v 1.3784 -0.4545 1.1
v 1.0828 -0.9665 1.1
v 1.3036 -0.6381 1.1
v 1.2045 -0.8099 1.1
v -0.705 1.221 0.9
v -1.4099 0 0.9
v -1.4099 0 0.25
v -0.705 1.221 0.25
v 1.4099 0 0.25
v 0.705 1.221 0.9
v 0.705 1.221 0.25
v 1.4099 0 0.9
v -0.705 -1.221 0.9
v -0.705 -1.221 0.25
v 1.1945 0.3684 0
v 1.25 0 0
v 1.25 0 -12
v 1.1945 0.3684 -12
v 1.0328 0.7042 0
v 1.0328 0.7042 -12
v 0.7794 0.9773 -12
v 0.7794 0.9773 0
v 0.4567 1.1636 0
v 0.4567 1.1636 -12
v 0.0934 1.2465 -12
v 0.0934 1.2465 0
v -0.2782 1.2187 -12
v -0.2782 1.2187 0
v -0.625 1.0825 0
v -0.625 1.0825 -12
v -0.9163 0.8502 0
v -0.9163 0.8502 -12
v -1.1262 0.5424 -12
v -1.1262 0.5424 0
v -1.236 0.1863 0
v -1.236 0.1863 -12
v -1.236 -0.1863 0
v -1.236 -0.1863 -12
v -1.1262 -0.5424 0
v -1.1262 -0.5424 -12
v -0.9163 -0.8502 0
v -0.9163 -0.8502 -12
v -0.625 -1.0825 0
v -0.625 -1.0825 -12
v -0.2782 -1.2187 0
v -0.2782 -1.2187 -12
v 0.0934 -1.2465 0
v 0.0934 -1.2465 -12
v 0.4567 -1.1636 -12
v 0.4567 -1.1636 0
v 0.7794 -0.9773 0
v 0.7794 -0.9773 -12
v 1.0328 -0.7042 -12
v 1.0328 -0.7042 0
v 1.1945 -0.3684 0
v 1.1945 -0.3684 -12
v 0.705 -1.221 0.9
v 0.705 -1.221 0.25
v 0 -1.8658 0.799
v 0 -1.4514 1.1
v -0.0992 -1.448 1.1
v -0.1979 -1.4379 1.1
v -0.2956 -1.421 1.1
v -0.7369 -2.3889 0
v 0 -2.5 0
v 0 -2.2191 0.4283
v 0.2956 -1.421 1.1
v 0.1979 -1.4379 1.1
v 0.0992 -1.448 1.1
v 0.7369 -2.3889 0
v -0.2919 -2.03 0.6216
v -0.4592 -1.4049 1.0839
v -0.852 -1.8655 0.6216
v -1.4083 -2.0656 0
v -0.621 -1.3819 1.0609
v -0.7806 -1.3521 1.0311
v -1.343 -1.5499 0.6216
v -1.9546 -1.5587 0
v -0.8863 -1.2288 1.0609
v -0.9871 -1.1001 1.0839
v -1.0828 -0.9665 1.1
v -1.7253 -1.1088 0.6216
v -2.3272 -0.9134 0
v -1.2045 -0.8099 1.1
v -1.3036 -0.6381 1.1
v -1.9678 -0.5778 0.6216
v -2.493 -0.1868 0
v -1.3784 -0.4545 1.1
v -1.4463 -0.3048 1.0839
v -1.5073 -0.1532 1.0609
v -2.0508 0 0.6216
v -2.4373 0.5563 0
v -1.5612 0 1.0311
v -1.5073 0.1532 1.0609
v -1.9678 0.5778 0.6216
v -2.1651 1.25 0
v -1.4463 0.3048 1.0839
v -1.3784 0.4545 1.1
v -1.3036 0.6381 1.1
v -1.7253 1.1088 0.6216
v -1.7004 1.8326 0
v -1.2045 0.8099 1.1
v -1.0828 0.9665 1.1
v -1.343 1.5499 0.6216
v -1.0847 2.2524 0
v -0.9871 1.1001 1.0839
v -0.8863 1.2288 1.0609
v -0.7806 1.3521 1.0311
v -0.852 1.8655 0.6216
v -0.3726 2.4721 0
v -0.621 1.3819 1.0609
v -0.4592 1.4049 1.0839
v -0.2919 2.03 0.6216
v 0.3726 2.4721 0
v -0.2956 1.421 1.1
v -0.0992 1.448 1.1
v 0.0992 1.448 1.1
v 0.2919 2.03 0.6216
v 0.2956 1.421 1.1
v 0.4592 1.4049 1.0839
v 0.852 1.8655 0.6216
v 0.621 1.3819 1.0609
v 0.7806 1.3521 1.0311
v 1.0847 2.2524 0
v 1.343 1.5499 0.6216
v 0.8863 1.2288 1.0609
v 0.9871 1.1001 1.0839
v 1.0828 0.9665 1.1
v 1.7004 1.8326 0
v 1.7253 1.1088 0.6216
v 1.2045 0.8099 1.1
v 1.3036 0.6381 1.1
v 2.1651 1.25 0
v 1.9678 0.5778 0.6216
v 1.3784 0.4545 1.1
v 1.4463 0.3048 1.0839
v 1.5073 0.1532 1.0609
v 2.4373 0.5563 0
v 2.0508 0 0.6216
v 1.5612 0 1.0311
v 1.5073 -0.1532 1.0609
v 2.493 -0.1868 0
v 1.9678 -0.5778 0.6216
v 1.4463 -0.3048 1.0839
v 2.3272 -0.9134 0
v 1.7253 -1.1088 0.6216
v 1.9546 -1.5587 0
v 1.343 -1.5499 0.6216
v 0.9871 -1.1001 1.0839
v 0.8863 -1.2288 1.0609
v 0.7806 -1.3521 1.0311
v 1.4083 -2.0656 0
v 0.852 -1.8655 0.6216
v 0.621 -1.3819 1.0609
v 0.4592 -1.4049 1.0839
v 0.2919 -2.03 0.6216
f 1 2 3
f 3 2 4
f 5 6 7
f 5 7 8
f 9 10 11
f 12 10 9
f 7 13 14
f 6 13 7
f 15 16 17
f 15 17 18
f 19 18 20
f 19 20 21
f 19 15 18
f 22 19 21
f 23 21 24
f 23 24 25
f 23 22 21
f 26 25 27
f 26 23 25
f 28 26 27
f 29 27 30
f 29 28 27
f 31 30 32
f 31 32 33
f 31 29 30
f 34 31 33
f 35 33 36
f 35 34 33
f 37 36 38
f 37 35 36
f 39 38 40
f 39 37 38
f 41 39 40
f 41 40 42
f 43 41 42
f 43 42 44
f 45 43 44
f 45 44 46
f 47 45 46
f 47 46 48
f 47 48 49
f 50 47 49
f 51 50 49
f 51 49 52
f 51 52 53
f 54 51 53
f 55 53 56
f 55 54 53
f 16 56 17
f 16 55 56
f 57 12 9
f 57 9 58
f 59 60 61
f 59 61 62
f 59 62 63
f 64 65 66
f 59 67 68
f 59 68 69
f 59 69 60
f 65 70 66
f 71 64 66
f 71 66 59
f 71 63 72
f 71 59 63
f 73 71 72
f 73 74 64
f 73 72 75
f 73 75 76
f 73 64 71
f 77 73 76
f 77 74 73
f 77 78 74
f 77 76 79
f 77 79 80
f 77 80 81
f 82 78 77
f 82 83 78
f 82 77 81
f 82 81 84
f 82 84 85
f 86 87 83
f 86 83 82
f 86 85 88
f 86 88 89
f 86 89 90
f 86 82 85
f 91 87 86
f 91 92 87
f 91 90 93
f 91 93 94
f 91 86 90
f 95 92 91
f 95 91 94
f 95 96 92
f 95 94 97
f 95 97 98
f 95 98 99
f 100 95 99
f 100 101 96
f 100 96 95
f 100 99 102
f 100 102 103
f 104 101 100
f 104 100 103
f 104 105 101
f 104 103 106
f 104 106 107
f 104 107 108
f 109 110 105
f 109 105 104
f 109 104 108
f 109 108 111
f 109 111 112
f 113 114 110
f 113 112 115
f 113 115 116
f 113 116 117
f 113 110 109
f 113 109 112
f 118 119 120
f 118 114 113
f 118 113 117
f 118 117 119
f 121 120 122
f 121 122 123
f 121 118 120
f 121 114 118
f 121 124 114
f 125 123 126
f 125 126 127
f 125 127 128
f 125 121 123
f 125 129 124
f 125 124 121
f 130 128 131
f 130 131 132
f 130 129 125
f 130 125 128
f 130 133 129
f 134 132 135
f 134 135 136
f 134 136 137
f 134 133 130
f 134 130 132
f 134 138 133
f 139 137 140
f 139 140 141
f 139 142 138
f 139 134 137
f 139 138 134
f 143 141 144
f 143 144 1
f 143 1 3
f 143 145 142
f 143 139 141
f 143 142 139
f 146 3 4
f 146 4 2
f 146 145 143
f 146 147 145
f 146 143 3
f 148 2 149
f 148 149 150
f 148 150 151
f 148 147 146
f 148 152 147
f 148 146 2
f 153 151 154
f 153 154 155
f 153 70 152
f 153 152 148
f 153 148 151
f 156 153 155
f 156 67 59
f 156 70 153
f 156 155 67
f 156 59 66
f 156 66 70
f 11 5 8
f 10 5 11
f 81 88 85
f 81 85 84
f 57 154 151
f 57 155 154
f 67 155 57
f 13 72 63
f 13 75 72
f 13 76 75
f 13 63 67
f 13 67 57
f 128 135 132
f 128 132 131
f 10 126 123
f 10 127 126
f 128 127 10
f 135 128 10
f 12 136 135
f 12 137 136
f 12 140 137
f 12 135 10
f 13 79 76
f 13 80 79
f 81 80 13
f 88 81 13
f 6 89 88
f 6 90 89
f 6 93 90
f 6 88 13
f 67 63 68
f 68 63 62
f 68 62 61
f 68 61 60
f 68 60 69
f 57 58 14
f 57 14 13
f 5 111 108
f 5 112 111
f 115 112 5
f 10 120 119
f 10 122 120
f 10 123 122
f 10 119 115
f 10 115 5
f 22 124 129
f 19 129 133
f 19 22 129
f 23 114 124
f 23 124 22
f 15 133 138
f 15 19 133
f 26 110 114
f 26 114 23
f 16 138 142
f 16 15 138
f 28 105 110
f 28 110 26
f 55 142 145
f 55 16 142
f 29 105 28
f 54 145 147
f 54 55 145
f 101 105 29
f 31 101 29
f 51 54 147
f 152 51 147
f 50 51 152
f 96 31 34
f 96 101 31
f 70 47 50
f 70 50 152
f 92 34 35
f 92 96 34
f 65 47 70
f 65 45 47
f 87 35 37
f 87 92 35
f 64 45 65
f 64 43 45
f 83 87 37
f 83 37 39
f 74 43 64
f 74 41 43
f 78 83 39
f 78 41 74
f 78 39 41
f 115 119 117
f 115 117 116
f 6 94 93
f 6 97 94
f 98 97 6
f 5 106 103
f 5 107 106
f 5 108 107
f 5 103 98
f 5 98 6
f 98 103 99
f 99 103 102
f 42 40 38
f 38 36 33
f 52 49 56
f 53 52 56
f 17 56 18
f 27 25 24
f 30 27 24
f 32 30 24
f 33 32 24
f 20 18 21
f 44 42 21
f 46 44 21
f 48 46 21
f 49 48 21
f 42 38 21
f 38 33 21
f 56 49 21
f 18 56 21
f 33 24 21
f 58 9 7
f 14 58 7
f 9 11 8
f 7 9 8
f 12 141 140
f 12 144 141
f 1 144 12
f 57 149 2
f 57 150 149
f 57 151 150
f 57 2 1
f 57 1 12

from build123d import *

# Parameters (mm, degrees)
SKETCH1_R               = 1.25
BOSS_EXTRUDE1_DEPTH     = 12
CUT_EXTRUDE1_DEPTH      = 1.25
CUT_EXTRUDE2_DEPTH      = 13.509996003
CUT_EXTRUDE2_DEPTH_BACK = 13.509996003
SKETCH6_W               = 1.249656436
SKETCH6_H               = 4.384153796
CHAMFER2_SIZE           = 0.2


with BuildPart() as part:
    # Sketch1 → Boss-Extrude1 (new body)
    with BuildSketch(Plane.XY):
        Circle(SKETCH1_R)
    extrude(amount=-BOSS_EXTRUDE1_DEPTH)

    # Sketch3 → Revolve1 (revolve)
    with BuildSketch(Plane(origin=(0, 0, 0), x_dir=(0, 0, -1), z_dir=(1, 0, 0)), mode=Mode.PRIVATE) as revolve1_sk:
        with BuildLine():
            ThreePointArc((-1.5, 0), (-1.096229956, 1.457737974), (0, 2.5))
            Line((0, 2.5), (0, 0))
            Line((0, 0), (-1.5, 0))
        make_face()
    revolve(revolve1_sk.sketch.rotate(Axis((0, 0, 1.5), (0, 0, -1)), 180), axis=Axis((0, 0, 1.5), (0, 0, -1)))

    # Sketch5 → Cut-Extrude1 (cut)
    with BuildSketch(Plane(origin=(0, 0, 1.5), x_dir=(-1, 0, 0), z_dir=(0, 0, -1))):
        Polygon((-1.409901945, 0), (-0.704950973, -1.221010901), (0.704950973, -1.221010901), (1.409901945, 0), (0.704950973, 1.221010901), (-0.704950973, 1.221010901), align=None)
    extrude(amount=CUT_EXTRUDE1_DEPTH, mode=Mode.SUBTRACT)

    # Sketch6 → Cut-Extrude2 (cut, two sides: drawn at the far end of the back side and taken through both)
    with BuildSketch(Plane(origin=(0, 0, 0), x_dir=(0, 0, -1), z_dir=(1, 0, 0)).offset(-CUT_EXTRUDE2_DEPTH_BACK)):
        with Locations((-1.724828218, 0.205450463)):
            Rectangle(SKETCH6_W, SKETCH6_H)
    extrude(amount=CUT_EXTRUDE2_DEPTH + CUT_EXTRUDE2_DEPTH_BACK, mode=Mode.SUBTRACT)

    # Chamfer2
    # the kernel refuses this chamfer: 0.2 mm, written as the material it takes off along each edge
    with BuildSketch(Plane(origin=(1.21928757, 1.221010901, 1.1), x_dir=(1.0390370186618431e-14, 0.9996219169112966, 0.02749587661058733), z_dir=(-1, 0, 0))) as chamfer2_piece_1_section:
        Polygon((CHAMFER2_SIZE * 0.999621916911, CHAMFER2_SIZE * 0.0274958766106), (-CHAMFER2_SIZE * 0.0274958766106, CHAMFER2_SIZE * 0.999621916911), (0, 0), align=None)
    chamfer2_piece_1 = extrude(amount=2.43857514, mode=Mode.PRIVATE)
    chamfer2_piece_1 = split(chamfer2_piece_1, bisect_by=Plane(origin=(0.501104512, 1.574083329, 1.032865614), z_dir=(-0.8660254037844416, -0.49999999999999495, 0)), keep=Keep.TOP, mode=Mode.PRIVATE)
    chamfer2_piece_1 = split(chamfer2_piece_1, bisect_by=Plane(origin=(-0.501104512, 1.574083329, 1.032865614), z_dir=(0.8660254037844347, -0.500000000000007, 0)), keep=Keep.TOP, mode=Mode.PRIVATE)
    add(chamfer2_piece_1, mode=Mode.SUBTRACT)
    with BuildSketch(Plane(origin=(1.667070244, -0.44542856, 1.1), x_dir=(0.8656979742248833, 0.4998109584556433, 0.027495876610586282), z_dir=(-0.49999999999999495, 0.8660254037844416, 0))) as chamfer2_piece_2_section:
        Polygon((CHAMFER2_SIZE * 0.999621916911, CHAMFER2_SIZE * 0.0274958766106), (-CHAMFER2_SIZE * 0.0274958766106, CHAMFER2_SIZE * 0.999621916911), (0, 0), align=None)
    chamfer2_piece_2 = extrude(amount=2.43857514, mode=Mode.PRIVATE)
    chamfer2_piece_2 = split(chamfer2_piece_2, bisect_by=Plane(origin=(1.613748406, 0.353072427, 1.032865614), z_dir=(-0.8660254037844382, 0.500000000000001, 0)), keep=Keep.TOP, mode=Mode.PRIVATE)
    chamfer2_piece_2 = split(chamfer2_piece_2, bisect_by=Plane(origin=(1.112643894, 1.221010901, 1.032865614), z_dir=(0, -1, 0)), keep=Keep.TOP, mode=Mode.PRIVATE)
    add(chamfer2_piece_2, mode=Mode.SUBTRACT)
    with BuildSketch(Plane(origin=(0.447782674, -1.666439461, 1.1), x_dir=(0.8656979742248797, -0.4998109584556493, 0.02749587661058626), z_dir=(0.500000000000001, 0.8660254037844382, 0))) as chamfer2_piece_3_section:
        Polygon((CHAMFER2_SIZE * 0.999621916911, CHAMFER2_SIZE * 0.0274958766106), (-CHAMFER2_SIZE * 0.0274958766106, CHAMFER2_SIZE * 0.999621916911), (0, 0), align=None)
    chamfer2_piece_3 = extrude(amount=2.43857514, mode=Mode.PRIVATE)
    chamfer2_piece_3 = split(chamfer2_piece_3, bisect_by=Plane(origin=(1.112643894, -1.221010901, 1.032865614), z_dir=(0, 1, 0)), keep=Keep.TOP, mode=Mode.PRIVATE)
    chamfer2_piece_3 = split(chamfer2_piece_3, bisect_by=Plane(origin=(1.613748406, -0.353072427, 1.032865614), z_dir=(-0.8660254037844416, -0.49999999999999495, 0)), keep=Keep.TOP, mode=Mode.PRIVATE)
    add(chamfer2_piece_3, mode=Mode.SUBTRACT)
    with BuildSketch(Plane(origin=(-1.21928757, -1.221010901, 1.1), x_dir=(-3.30602687756041e-15, -0.9996219169112968, 0.027495876610586285), z_dir=(1, 0, 0))) as chamfer2_piece_4_section:
        Polygon((CHAMFER2_SIZE * 0.999621916911, CHAMFER2_SIZE * 0.0274958766106), (-CHAMFER2_SIZE * 0.0274958766106, CHAMFER2_SIZE * 0.999621916911), (0, 0), align=None)
    chamfer2_piece_4 = extrude(amount=2.43857514, mode=Mode.PRIVATE)
    chamfer2_piece_4 = split(chamfer2_piece_4, bisect_by=Plane(origin=(-0.501104512, -1.574083329, 1.032865614), z_dir=(0.8660254037844417, 0.49999999999999484, 0)), keep=Keep.TOP, mode=Mode.PRIVATE)
    chamfer2_piece_4 = split(chamfer2_piece_4, bisect_by=Plane(origin=(0.501104512, -1.574083329, 1.032865614), z_dir=(-0.8660254037844382, 0.500000000000001, 0)), keep=Keep.TOP, mode=Mode.PRIVATE)
    add(chamfer2_piece_4, mode=Mode.SUBTRACT)
    with BuildSketch(Plane(origin=(-1.667070244, 0.44542856, 1.1), x_dir=(-0.8656979742248834, -0.4998109584556432, 0.027495876610586265), z_dir=(0.49999999999999484, -0.8660254037844417, 0))) as chamfer2_piece_5_section:
        Polygon((CHAMFER2_SIZE * 0.999621916911, CHAMFER2_SIZE * 0.0274958766106), (-CHAMFER2_SIZE * 0.0274958766106, CHAMFER2_SIZE * 0.999621916911), (0, 0), align=None)
    chamfer2_piece_5 = extrude(amount=2.43857514, mode=Mode.PRIVATE)
    chamfer2_piece_5 = split(chamfer2_piece_5, bisect_by=Plane(origin=(-1.112643894, -1.221010901, 1.032865614), z_dir=(0, 1, 0)), keep=Keep.TOP, mode=Mode.PRIVATE)
    chamfer2_piece_5 = split(chamfer2_piece_5, bisect_by=Plane(origin=(-1.613748406, -0.353072427, 1.032865614), z_dir=(0.8660254037844347, -0.500000000000007, 0)), keep=Keep.TOP, mode=Mode.PRIVATE)
    add(chamfer2_piece_5, mode=Mode.SUBTRACT)
    with BuildSketch(Plane(origin=(-0.447782674, 1.666439461, 1.1), x_dir=(-0.8656979742248764, 0.4998109584556554, 0.027495876610586265), z_dir=(-0.500000000000007, -0.8660254037844347, 0))) as chamfer2_piece_6_section:
        Polygon((CHAMFER2_SIZE * 0.999621916911, CHAMFER2_SIZE * 0.0274958766106), (-CHAMFER2_SIZE * 0.0274958766106, CHAMFER2_SIZE * 0.999621916911), (0, 0), align=None)
    chamfer2_piece_6 = extrude(amount=2.43857514, mode=Mode.PRIVATE)
    chamfer2_piece_6 = split(chamfer2_piece_6, bisect_by=Plane(origin=(-1.112643894, 1.221010901, 1.032865614), z_dir=(0, -1, 0)), keep=Keep.TOP, mode=Mode.PRIVATE)
    chamfer2_piece_6 = split(chamfer2_piece_6, bisect_by=Plane(origin=(-1.613748406, 0.353072427, 1.032865614), z_dir=(0.8660254037844417, 0.49999999999999484, 0)), keep=Keep.TOP, mode=Mode.PRIVATE)
    add(chamfer2_piece_6, mode=Mode.SUBTRACT)
    with BuildSketch(Plane(origin=(1.667070244, -0.44542856, 1.1), x_dir=(0.8656979742248833, 0.4998109584556433, 0.027495876610586282), z_dir=(-0.49999999999999495, 0.8660254037844416, 0))) as chamfer2_piece_7a_section:
        Polygon((CHAMFER2_SIZE * 0.999621916911, CHAMFER2_SIZE * 0.0274958766106), (-CHAMFER2_SIZE * 0.0274958766106, CHAMFER2_SIZE * 0.999621916911), (0, 0), align=None)
    chamfer2_piece_7a = extrude(amount=2.43857514, mode=Mode.PRIVATE)
    chamfer2_piece_7a = split(chamfer2_piece_7a, bisect_by=Plane(origin=(0.645691333, 1.221010901, 1.035460513), z_dir=(0, 1, 0)), keep=Keep.TOP, mode=Mode.PRIVATE)
    with BuildSketch(Plane(origin=(1.21928757, 1.221010901, 1.1), x_dir=(1.0390370186618431e-14, 0.9996219169112966, 0.02749587661058733), z_dir=(-1, 0, 0))) as chamfer2_piece_7b_section:
        Polygon((CHAMFER2_SIZE * 0.999621916911, CHAMFER2_SIZE * 0.0274958766106), (-CHAMFER2_SIZE * 0.0274958766106, CHAMFER2_SIZE * 0.999621916911), (0, 0), align=None)
    chamfer2_piece_7b = extrude(amount=2.43857514, mode=Mode.PRIVATE)
    chamfer2_piece_7b = split(chamfer2_piece_7b, bisect_by=Plane(origin=(0.734580793, 1.169690548, 1.035460513), z_dir=(0.8660254037844416, 0.49999999999999495, 0)), keep=Keep.TOP, mode=Mode.PRIVATE)
    chamfer2_piece_7 = chamfer2_piece_7a & chamfer2_piece_7b
    add(chamfer2_piece_7, mode=Mode.SUBTRACT)
    with BuildSketch(Plane(origin=(1.21928757, 1.221010901, 1.1), x_dir=(1.0390370186618431e-14, 0.9996219169112966, 0.02749587661058733), z_dir=(-1, 0, 0))) as chamfer2_piece_8a_section:
        Polygon((CHAMFER2_SIZE * 0.999621916911, CHAMFER2_SIZE * 0.0274958766106), (-CHAMFER2_SIZE * 0.0274958766106, CHAMFER2_SIZE * 0.999621916911), (0, 0), align=None)
    chamfer2_piece_8a = extrude(amount=2.43857514, mode=Mode.PRIVATE)
    chamfer2_piece_8a = split(chamfer2_piece_8a, bisect_by=Plane(origin=(-0.734580793, 1.169690548, 1.035460513), z_dir=(-0.8660254037844347, 0.500000000000007, 0)), keep=Keep.TOP, mode=Mode.PRIVATE)
    with BuildSketch(Plane(origin=(-0.447782674, 1.666439461, 1.1), x_dir=(-0.8656979742248764, 0.4998109584556554, 0.027495876610586265), z_dir=(-0.500000000000007, -0.8660254037844347, 0))) as chamfer2_piece_8b_section:
        Polygon((CHAMFER2_SIZE * 0.999621916911, CHAMFER2_SIZE * 0.0274958766106), (-CHAMFER2_SIZE * 0.0274958766106, CHAMFER2_SIZE * 0.999621916911), (0, 0), align=None)
    chamfer2_piece_8b = extrude(amount=2.43857514, mode=Mode.PRIVATE)
    chamfer2_piece_8b = split(chamfer2_piece_8b, bisect_by=Plane(origin=(-0.645691333, 1.221010901, 1.035460513), z_dir=(0, 1, 0)), keep=Keep.TOP, mode=Mode.PRIVATE)
    chamfer2_piece_8 = chamfer2_piece_8a & chamfer2_piece_8b
    add(chamfer2_piece_8, mode=Mode.SUBTRACT)
    with BuildSketch(Plane(origin=(0.447782674, -1.666439461, 1.1), x_dir=(0.8656979742248797, -0.4998109584556493, 0.02749587661058626), z_dir=(0.500000000000001, 0.8660254037844382, 0))) as chamfer2_piece_9a_section:
        Polygon((CHAMFER2_SIZE * 0.999621916911, CHAMFER2_SIZE * 0.0274958766106), (-CHAMFER2_SIZE * 0.0274958766106, CHAMFER2_SIZE * 0.999621916911), (0, 0), align=None)
    chamfer2_piece_9a = extrude(amount=2.43857514, mode=Mode.PRIVATE)
    chamfer2_piece_9a = split(chamfer2_piece_9a, bisect_by=Plane(origin=(1.380272125, 0.051320354, 1.035460513), z_dir=(0.8660254037844416, 0.49999999999999495, 0)), keep=Keep.TOP, mode=Mode.PRIVATE)
    with BuildSketch(Plane(origin=(1.667070244, -0.44542856, 1.1), x_dir=(0.8656979742248833, 0.4998109584556433, 0.027495876610586282), z_dir=(-0.49999999999999495, 0.8660254037844416, 0))) as chamfer2_piece_9b_section:
        Polygon((CHAMFER2_SIZE * 0.999621916911, CHAMFER2_SIZE * 0.0274958766106), (-CHAMFER2_SIZE * 0.0274958766106, CHAMFER2_SIZE * 0.999621916911), (0, 0), align=None)
    chamfer2_piece_9b = extrude(amount=2.43857514, mode=Mode.PRIVATE)
    chamfer2_piece_9b = split(chamfer2_piece_9b, bisect_by=Plane(origin=(1.380272125, -0.051320354, 1.035460513), z_dir=(0.8660254037844382, -0.500000000000001, 0)), keep=Keep.TOP, mode=Mode.PRIVATE)
    chamfer2_piece_9 = chamfer2_piece_9a & chamfer2_piece_9b
    add(chamfer2_piece_9, mode=Mode.SUBTRACT)
    with BuildSketch(Plane(origin=(-1.21928757, -1.221010901, 1.1), x_dir=(-3.30602687756041e-15, -0.9996219169112968, 0.027495876610586285), z_dir=(1, 0, 0))) as chamfer2_piece_10a_section:
        Polygon((CHAMFER2_SIZE * 0.999621916911, CHAMFER2_SIZE * 0.0274958766106), (-CHAMFER2_SIZE * 0.0274958766106, CHAMFER2_SIZE * 0.999621916911), (0, 0), align=None)
    chamfer2_piece_10a = extrude(amount=2.43857514, mode=Mode.PRIVATE)
    chamfer2_piece_10a = split(chamfer2_piece_10a, bisect_by=Plane(origin=(0.734580793, -1.169690548, 1.035460513), z_dir=(0.8660254037844382, -0.500000000000001, 0)), keep=Keep.TOP, mode=Mode.PRIVATE)
    with BuildSketch(Plane(origin=(0.447782674, -1.666439461, 1.1), x_dir=(0.8656979742248797, -0.4998109584556493, 0.02749587661058626), z_dir=(0.500000000000001, 0.8660254037844382, 0))) as chamfer2_piece_10b_section:
        Polygon((CHAMFER2_SIZE * 0.999621916911, CHAMFER2_SIZE * 0.0274958766106), (-CHAMFER2_SIZE * 0.0274958766106, CHAMFER2_SIZE * 0.999621916911), (0, 0), align=None)
    chamfer2_piece_10b = extrude(amount=2.43857514, mode=Mode.PRIVATE)
    chamfer2_piece_10b = split(chamfer2_piece_10b, bisect_by=Plane(origin=(0.645691333, -1.221010901, 1.035460513), z_dir=(0, -1, 0)), keep=Keep.TOP, mode=Mode.PRIVATE)
    chamfer2_piece_10 = chamfer2_piece_10a & chamfer2_piece_10b
    add(chamfer2_piece_10, mode=Mode.SUBTRACT)
    with BuildSketch(Plane(origin=(-1.21928757, -1.221010901, 1.1), x_dir=(-3.30602687756041e-15, -0.9996219169112968, 0.027495876610586285), z_dir=(1, 0, 0))) as chamfer2_piece_11a_section:
        Polygon((CHAMFER2_SIZE * 0.999621916911, CHAMFER2_SIZE * 0.0274958766106), (-CHAMFER2_SIZE * 0.0274958766106, CHAMFER2_SIZE * 0.999621916911), (0, 0), align=None)
    chamfer2_piece_11a = extrude(amount=2.43857514, mode=Mode.PRIVATE)
    chamfer2_piece_11a = split(chamfer2_piece_11a, bisect_by=Plane(origin=(-0.734580793, -1.169690548, 1.035460513), z_dir=(-0.8660254037844417, -0.49999999999999484, 0)), keep=Keep.TOP, mode=Mode.PRIVATE)
    with BuildSketch(Plane(origin=(-1.667070244, 0.44542856, 1.1), x_dir=(-0.8656979742248834, -0.4998109584556432, 0.027495876610586265), z_dir=(0.49999999999999484, -0.8660254037844417, 0))) as chamfer2_piece_11b_section:
        Polygon((CHAMFER2_SIZE * 0.999621916911, CHAMFER2_SIZE * 0.0274958766106), (-CHAMFER2_SIZE * 0.0274958766106, CHAMFER2_SIZE * 0.999621916911), (0, 0), align=None)
    chamfer2_piece_11b = extrude(amount=2.43857514, mode=Mode.PRIVATE)
    chamfer2_piece_11b = split(chamfer2_piece_11b, bisect_by=Plane(origin=(-0.645691333, -1.221010901, 1.035460513), z_dir=(0, -1, 0)), keep=Keep.TOP, mode=Mode.PRIVATE)
    chamfer2_piece_11 = chamfer2_piece_11a & chamfer2_piece_11b
    add(chamfer2_piece_11, mode=Mode.SUBTRACT)
    with BuildSketch(Plane(origin=(-0.447782674, 1.666439461, 1.1), x_dir=(-0.8656979742248764, 0.4998109584556554, 0.027495876610586265), z_dir=(-0.500000000000007, -0.8660254037844347, 0))) as chamfer2_piece_12a_section:
        Polygon((CHAMFER2_SIZE * 0.999621916911, CHAMFER2_SIZE * 0.0274958766106), (-CHAMFER2_SIZE * 0.0274958766106, CHAMFER2_SIZE * 0.999621916911), (0, 0), align=None)
    chamfer2_piece_12a = extrude(amount=2.43857514, mode=Mode.PRIVATE)
    chamfer2_piece_12a = split(chamfer2_piece_12a, bisect_by=Plane(origin=(-1.380272125, -0.051320354, 1.035460513), z_dir=(-0.8660254037844417, -0.49999999999999484, 0)), keep=Keep.TOP, mode=Mode.PRIVATE)
    with BuildSketch(Plane(origin=(-1.667070244, 0.44542856, 1.1), x_dir=(-0.8656979742248834, -0.4998109584556432, 0.027495876610586265), z_dir=(0.49999999999999484, -0.8660254037844417, 0))) as chamfer2_piece_12b_section:
        Polygon((CHAMFER2_SIZE * 0.999621916911, CHAMFER2_SIZE * 0.0274958766106), (-CHAMFER2_SIZE * 0.0274958766106, CHAMFER2_SIZE * 0.999621916911), (0, 0), align=None)
    chamfer2_piece_12b = extrude(amount=2.43857514, mode=Mode.PRIVATE)
    chamfer2_piece_12b = split(chamfer2_piece_12b, bisect_by=Plane(origin=(-1.380272125, 0.051320354, 1.035460513), z_dir=(-0.8660254037844347, 0.500000000000007, 0)), keep=Keep.TOP, mode=Mode.PRIVATE)
    chamfer2_piece_12 = chamfer2_piece_12a & chamfer2_piece_12b
    add(chamfer2_piece_12, mode=Mode.SUBTRACT)


solid = part.part
